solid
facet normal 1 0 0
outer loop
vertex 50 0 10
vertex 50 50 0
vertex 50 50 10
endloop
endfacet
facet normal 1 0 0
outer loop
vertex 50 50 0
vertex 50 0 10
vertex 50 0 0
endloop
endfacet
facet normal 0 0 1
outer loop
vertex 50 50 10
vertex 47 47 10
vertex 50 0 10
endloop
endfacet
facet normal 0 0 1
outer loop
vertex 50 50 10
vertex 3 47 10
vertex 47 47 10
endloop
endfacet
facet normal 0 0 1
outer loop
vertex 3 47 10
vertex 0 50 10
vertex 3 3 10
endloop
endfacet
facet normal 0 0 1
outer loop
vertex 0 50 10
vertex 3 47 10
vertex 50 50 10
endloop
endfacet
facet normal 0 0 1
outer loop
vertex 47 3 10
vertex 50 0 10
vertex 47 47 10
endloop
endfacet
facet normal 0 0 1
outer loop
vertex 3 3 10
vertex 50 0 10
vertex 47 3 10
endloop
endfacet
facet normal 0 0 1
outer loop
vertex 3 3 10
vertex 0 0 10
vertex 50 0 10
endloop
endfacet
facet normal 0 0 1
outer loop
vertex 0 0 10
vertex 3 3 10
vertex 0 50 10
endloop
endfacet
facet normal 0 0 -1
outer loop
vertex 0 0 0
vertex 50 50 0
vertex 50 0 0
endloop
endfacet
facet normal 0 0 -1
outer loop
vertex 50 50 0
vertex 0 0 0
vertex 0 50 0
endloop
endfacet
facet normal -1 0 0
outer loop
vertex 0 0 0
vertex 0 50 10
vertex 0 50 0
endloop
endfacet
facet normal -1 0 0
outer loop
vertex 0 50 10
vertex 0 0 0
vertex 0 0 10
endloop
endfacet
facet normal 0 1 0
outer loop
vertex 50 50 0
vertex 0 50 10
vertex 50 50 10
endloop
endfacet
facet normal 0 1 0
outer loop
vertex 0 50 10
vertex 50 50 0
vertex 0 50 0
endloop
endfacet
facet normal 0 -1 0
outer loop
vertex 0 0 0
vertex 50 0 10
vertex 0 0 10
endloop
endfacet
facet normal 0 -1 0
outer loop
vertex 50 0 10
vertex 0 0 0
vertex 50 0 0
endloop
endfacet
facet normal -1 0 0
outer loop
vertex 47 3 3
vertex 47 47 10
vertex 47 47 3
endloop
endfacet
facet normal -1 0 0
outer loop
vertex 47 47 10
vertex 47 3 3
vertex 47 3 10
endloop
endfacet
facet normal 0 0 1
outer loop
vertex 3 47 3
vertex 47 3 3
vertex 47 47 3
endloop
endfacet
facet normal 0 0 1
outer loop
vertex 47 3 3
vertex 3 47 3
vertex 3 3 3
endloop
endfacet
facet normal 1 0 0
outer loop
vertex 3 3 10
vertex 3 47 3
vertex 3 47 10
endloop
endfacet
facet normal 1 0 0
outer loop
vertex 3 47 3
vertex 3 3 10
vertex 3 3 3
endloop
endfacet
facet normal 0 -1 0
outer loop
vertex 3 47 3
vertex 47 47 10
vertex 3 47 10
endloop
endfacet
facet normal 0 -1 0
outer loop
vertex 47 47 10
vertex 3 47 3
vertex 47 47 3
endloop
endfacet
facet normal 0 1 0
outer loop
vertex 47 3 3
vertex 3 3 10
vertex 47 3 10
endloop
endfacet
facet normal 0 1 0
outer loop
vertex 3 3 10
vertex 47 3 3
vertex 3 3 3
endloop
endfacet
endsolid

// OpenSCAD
// Generated by HEIDI for job job_1787786625435_eb71aeee
// Product: 3D-Printable Model Preparation Package
// Request: Failure injection test
// Model type: box
// Generated: 2026-09-07T04:35:16.078Z
//
// This is a parameterized OpenSCAD model. You can adjust the
// parameters below to customize the dimensions before rendering.

// ─── Parameters ───
width = 50;       // X dimension in mm
height = 50;     // Y dimension in mm
depth = 10;       // Z dimension in mm
wall = 3;    // wall thickness in mm
$fn = 60;               // facet resolution

// Parametric hollow box
module parametric_box() {
    difference() {
        // Outer shell
        cube([width, height, depth]);
        // Inner cavity
        translate([wall, wall, wall])
            cube([width - wall * 2, height - wall * 2, depth - wall + 1]);
    }
}
parametric_box();
